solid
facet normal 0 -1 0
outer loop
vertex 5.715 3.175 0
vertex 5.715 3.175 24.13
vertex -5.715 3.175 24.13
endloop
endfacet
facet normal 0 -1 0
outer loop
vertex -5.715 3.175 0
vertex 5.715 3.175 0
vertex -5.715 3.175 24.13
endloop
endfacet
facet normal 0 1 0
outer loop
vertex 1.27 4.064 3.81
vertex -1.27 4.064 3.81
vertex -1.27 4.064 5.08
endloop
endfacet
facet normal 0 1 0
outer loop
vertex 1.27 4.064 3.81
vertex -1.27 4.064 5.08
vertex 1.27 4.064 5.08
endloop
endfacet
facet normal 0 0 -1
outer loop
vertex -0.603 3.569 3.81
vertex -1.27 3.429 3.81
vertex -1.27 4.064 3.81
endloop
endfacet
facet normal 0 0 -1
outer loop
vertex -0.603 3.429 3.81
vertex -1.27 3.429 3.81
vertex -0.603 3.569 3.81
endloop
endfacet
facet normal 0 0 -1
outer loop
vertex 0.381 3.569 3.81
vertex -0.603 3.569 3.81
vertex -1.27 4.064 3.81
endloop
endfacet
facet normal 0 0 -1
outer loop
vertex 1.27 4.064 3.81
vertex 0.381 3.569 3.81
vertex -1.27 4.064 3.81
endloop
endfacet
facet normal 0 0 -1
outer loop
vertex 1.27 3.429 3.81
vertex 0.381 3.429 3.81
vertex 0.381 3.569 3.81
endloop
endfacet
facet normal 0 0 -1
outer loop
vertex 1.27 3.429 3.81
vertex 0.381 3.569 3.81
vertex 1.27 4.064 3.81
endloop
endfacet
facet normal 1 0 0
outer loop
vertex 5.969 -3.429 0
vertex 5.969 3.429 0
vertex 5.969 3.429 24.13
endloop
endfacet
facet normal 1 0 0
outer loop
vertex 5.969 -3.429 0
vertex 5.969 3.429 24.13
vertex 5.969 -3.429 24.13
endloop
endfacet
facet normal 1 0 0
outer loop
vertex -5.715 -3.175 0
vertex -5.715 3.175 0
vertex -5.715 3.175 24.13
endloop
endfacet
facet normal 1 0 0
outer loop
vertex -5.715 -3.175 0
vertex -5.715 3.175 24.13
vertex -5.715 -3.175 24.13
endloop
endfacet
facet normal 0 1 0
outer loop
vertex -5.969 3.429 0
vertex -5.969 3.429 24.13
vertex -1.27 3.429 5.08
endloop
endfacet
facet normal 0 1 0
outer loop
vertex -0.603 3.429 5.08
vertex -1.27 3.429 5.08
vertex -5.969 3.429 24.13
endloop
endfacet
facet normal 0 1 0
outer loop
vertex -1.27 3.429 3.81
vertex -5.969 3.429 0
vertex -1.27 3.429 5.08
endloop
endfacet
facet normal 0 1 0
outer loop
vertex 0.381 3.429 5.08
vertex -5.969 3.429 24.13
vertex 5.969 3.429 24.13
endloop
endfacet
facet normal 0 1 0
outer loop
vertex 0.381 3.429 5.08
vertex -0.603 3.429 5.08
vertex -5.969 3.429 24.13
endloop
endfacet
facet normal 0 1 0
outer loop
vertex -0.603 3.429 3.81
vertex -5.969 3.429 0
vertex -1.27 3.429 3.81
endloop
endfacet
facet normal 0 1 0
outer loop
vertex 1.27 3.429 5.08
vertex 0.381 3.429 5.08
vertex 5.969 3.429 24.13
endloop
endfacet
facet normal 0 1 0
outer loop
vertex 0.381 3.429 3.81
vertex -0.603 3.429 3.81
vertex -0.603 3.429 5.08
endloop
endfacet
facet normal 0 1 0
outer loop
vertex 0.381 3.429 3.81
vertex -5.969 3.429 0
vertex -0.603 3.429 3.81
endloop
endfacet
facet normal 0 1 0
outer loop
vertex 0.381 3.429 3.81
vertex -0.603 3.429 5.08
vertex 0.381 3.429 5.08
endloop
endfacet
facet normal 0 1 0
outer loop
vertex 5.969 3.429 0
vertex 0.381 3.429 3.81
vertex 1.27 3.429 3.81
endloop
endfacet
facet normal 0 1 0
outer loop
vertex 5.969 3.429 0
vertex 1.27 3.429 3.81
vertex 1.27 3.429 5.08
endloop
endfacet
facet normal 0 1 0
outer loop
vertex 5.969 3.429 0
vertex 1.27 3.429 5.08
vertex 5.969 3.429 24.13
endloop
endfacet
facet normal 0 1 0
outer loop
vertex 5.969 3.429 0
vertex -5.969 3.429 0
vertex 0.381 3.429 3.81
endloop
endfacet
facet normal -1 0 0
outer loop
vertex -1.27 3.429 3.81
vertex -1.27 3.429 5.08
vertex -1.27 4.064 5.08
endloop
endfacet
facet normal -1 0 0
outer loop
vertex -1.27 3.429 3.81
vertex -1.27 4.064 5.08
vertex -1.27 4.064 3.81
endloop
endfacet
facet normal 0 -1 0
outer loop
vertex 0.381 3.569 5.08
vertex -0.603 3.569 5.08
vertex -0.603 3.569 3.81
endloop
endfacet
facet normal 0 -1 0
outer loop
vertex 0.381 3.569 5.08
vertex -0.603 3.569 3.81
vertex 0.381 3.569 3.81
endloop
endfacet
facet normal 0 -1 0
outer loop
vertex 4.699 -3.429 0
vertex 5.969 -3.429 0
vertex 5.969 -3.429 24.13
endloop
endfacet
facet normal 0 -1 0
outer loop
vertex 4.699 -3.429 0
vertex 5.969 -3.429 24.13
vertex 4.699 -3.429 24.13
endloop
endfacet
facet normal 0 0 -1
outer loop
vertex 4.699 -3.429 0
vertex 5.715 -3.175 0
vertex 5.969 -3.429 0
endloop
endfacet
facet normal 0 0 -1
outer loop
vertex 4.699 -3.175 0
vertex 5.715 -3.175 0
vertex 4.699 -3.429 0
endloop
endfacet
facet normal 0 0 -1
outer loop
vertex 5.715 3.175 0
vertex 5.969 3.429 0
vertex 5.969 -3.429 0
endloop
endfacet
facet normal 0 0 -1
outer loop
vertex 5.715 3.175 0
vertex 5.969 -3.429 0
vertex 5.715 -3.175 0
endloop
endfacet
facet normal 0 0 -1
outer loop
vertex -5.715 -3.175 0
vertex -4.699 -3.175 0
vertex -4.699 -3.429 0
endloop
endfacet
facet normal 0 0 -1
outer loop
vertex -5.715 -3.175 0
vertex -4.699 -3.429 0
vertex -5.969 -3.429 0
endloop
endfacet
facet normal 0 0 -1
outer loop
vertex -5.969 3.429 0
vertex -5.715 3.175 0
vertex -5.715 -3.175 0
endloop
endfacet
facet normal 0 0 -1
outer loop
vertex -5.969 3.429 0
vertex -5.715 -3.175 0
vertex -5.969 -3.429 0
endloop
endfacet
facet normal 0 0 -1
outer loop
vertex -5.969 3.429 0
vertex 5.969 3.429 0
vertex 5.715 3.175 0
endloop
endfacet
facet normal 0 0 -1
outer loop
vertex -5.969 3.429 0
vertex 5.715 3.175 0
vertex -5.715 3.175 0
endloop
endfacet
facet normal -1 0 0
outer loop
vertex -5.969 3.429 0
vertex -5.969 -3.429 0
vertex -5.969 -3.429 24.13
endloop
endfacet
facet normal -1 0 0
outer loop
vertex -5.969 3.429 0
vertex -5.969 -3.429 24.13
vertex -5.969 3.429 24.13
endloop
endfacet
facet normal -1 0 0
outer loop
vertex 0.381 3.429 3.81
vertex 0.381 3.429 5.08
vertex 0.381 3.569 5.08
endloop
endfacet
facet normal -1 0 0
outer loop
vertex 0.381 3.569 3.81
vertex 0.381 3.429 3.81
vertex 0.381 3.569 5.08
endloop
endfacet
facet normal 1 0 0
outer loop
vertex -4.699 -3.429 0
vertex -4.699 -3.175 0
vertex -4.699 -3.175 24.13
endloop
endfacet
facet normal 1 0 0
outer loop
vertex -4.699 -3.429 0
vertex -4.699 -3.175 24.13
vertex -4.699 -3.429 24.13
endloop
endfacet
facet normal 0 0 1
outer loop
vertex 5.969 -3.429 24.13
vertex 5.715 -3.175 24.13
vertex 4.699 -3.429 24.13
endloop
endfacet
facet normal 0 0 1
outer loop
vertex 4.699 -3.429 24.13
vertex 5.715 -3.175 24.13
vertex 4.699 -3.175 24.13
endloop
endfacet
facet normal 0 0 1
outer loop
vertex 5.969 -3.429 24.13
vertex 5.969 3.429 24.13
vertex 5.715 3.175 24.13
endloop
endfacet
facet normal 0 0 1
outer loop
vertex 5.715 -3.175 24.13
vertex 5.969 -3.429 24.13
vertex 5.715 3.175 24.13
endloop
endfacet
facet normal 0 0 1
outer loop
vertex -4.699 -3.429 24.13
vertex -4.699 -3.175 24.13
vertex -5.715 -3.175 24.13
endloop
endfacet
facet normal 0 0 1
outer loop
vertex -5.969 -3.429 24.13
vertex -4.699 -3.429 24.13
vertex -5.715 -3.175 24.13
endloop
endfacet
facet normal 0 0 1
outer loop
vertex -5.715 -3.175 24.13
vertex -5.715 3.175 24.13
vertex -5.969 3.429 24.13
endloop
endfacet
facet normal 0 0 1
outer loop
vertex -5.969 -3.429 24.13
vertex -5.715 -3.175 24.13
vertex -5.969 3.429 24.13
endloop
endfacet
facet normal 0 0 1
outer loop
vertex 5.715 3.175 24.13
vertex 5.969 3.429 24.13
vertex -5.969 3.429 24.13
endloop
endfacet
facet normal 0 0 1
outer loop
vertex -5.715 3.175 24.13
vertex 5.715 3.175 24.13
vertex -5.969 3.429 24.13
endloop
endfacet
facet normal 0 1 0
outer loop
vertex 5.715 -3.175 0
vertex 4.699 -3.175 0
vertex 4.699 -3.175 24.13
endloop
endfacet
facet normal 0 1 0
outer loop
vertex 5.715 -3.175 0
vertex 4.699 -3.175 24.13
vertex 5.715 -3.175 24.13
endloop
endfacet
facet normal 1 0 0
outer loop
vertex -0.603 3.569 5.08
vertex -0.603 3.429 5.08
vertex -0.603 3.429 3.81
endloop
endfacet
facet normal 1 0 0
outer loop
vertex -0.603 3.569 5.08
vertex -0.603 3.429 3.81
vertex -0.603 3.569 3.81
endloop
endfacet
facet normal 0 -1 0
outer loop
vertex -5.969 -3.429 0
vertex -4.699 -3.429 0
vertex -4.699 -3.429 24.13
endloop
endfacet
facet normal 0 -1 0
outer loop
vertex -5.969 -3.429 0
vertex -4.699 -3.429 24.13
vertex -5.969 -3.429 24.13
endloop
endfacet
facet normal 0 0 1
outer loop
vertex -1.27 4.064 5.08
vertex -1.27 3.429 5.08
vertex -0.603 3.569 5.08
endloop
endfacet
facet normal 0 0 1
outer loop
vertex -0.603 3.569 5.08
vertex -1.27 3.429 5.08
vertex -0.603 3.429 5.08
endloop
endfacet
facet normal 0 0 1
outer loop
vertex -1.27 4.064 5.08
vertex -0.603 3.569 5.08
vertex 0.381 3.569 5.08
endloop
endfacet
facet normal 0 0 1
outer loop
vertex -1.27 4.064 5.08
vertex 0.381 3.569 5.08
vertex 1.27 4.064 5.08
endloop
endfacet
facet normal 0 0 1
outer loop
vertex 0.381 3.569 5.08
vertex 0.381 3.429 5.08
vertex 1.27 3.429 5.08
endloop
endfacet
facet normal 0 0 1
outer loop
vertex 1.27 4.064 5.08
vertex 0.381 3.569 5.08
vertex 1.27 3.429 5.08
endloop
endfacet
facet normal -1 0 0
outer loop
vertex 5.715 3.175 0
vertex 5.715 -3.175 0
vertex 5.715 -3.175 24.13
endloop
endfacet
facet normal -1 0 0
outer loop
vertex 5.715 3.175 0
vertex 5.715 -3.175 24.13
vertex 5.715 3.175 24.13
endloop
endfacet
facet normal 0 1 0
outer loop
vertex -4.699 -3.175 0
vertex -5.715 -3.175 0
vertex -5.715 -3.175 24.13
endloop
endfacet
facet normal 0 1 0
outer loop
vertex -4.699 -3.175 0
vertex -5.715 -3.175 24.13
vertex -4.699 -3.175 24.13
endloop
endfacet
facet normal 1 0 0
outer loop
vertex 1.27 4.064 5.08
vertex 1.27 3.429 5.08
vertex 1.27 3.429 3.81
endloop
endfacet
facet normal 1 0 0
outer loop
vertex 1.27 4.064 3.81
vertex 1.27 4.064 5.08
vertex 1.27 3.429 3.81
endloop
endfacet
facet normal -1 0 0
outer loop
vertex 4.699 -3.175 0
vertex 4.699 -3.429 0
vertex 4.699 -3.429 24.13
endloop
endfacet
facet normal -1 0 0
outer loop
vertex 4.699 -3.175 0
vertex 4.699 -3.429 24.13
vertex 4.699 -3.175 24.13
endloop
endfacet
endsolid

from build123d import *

# Parameters (mm, degrees)
BOSS_EXTRUDE1_DEPTH = 24.13
SKETCH2_W           = 2.54
SKETCH2_H           = 1.27
BOSS_EXTRUDE2_DEPTH = 0.635
CUT_EXTRUDE1_REACH  = 22.373
SKETCH3_W           = 0.984815379
SKETCH3_H           = 0.139763968


with BuildPart() as part:
    # Sketch1 → Boss-Extrude1 (new body)
    with BuildSketch(Plane.XY):
        Polygon((-5.715, 3.175), (-5.715, -3.175), (-4.699, -3.175), (-4.699, -3.429), (-5.969, -3.429), (-5.969, 3.429), (5.969, 3.429), (5.969, -3.429), (4.699, -3.429), (4.699, -3.175), (5.715, -3.175), (5.715, 3.175), align=None)
    extrude(amount=BOSS_EXTRUDE1_DEPTH)

    # Sketch2 → Boss-Extrude2 (add)
    with BuildSketch(Plane(origin=(0, 3.429, 0), x_dir=(1, 0, 0), z_dir=(0, 1, 0))):
        with Locations((0, -4.445)):
            Rectangle(SKETCH2_W, SKETCH2_H)
    extrude(amount=BOSS_EXTRUDE2_DEPTH)

    # Sketch3 → Cut-Extrude1 (cut, up to next)
    with BuildSketch(Plane.XY.offset(5.08), mode=Mode.PRIVATE) as cut_extrude1_sk1:
        with Locations((-0.110929993, 3.498881984)):
            Rectangle(SKETCH3_W, SKETCH3_H)
    cut_extrude1_tool1 = extrude(cut_extrude1_sk1.sketch, amount=-CUT_EXTRUDE1_REACH, mode=Mode.PRIVATE) & part.part
    add(cut_extrude1_tool1.solids().sort_by_distance((-0.11093, 3.498882, 5.08))[0], mode=Mode.SUBTRACT)


solid = part.part
